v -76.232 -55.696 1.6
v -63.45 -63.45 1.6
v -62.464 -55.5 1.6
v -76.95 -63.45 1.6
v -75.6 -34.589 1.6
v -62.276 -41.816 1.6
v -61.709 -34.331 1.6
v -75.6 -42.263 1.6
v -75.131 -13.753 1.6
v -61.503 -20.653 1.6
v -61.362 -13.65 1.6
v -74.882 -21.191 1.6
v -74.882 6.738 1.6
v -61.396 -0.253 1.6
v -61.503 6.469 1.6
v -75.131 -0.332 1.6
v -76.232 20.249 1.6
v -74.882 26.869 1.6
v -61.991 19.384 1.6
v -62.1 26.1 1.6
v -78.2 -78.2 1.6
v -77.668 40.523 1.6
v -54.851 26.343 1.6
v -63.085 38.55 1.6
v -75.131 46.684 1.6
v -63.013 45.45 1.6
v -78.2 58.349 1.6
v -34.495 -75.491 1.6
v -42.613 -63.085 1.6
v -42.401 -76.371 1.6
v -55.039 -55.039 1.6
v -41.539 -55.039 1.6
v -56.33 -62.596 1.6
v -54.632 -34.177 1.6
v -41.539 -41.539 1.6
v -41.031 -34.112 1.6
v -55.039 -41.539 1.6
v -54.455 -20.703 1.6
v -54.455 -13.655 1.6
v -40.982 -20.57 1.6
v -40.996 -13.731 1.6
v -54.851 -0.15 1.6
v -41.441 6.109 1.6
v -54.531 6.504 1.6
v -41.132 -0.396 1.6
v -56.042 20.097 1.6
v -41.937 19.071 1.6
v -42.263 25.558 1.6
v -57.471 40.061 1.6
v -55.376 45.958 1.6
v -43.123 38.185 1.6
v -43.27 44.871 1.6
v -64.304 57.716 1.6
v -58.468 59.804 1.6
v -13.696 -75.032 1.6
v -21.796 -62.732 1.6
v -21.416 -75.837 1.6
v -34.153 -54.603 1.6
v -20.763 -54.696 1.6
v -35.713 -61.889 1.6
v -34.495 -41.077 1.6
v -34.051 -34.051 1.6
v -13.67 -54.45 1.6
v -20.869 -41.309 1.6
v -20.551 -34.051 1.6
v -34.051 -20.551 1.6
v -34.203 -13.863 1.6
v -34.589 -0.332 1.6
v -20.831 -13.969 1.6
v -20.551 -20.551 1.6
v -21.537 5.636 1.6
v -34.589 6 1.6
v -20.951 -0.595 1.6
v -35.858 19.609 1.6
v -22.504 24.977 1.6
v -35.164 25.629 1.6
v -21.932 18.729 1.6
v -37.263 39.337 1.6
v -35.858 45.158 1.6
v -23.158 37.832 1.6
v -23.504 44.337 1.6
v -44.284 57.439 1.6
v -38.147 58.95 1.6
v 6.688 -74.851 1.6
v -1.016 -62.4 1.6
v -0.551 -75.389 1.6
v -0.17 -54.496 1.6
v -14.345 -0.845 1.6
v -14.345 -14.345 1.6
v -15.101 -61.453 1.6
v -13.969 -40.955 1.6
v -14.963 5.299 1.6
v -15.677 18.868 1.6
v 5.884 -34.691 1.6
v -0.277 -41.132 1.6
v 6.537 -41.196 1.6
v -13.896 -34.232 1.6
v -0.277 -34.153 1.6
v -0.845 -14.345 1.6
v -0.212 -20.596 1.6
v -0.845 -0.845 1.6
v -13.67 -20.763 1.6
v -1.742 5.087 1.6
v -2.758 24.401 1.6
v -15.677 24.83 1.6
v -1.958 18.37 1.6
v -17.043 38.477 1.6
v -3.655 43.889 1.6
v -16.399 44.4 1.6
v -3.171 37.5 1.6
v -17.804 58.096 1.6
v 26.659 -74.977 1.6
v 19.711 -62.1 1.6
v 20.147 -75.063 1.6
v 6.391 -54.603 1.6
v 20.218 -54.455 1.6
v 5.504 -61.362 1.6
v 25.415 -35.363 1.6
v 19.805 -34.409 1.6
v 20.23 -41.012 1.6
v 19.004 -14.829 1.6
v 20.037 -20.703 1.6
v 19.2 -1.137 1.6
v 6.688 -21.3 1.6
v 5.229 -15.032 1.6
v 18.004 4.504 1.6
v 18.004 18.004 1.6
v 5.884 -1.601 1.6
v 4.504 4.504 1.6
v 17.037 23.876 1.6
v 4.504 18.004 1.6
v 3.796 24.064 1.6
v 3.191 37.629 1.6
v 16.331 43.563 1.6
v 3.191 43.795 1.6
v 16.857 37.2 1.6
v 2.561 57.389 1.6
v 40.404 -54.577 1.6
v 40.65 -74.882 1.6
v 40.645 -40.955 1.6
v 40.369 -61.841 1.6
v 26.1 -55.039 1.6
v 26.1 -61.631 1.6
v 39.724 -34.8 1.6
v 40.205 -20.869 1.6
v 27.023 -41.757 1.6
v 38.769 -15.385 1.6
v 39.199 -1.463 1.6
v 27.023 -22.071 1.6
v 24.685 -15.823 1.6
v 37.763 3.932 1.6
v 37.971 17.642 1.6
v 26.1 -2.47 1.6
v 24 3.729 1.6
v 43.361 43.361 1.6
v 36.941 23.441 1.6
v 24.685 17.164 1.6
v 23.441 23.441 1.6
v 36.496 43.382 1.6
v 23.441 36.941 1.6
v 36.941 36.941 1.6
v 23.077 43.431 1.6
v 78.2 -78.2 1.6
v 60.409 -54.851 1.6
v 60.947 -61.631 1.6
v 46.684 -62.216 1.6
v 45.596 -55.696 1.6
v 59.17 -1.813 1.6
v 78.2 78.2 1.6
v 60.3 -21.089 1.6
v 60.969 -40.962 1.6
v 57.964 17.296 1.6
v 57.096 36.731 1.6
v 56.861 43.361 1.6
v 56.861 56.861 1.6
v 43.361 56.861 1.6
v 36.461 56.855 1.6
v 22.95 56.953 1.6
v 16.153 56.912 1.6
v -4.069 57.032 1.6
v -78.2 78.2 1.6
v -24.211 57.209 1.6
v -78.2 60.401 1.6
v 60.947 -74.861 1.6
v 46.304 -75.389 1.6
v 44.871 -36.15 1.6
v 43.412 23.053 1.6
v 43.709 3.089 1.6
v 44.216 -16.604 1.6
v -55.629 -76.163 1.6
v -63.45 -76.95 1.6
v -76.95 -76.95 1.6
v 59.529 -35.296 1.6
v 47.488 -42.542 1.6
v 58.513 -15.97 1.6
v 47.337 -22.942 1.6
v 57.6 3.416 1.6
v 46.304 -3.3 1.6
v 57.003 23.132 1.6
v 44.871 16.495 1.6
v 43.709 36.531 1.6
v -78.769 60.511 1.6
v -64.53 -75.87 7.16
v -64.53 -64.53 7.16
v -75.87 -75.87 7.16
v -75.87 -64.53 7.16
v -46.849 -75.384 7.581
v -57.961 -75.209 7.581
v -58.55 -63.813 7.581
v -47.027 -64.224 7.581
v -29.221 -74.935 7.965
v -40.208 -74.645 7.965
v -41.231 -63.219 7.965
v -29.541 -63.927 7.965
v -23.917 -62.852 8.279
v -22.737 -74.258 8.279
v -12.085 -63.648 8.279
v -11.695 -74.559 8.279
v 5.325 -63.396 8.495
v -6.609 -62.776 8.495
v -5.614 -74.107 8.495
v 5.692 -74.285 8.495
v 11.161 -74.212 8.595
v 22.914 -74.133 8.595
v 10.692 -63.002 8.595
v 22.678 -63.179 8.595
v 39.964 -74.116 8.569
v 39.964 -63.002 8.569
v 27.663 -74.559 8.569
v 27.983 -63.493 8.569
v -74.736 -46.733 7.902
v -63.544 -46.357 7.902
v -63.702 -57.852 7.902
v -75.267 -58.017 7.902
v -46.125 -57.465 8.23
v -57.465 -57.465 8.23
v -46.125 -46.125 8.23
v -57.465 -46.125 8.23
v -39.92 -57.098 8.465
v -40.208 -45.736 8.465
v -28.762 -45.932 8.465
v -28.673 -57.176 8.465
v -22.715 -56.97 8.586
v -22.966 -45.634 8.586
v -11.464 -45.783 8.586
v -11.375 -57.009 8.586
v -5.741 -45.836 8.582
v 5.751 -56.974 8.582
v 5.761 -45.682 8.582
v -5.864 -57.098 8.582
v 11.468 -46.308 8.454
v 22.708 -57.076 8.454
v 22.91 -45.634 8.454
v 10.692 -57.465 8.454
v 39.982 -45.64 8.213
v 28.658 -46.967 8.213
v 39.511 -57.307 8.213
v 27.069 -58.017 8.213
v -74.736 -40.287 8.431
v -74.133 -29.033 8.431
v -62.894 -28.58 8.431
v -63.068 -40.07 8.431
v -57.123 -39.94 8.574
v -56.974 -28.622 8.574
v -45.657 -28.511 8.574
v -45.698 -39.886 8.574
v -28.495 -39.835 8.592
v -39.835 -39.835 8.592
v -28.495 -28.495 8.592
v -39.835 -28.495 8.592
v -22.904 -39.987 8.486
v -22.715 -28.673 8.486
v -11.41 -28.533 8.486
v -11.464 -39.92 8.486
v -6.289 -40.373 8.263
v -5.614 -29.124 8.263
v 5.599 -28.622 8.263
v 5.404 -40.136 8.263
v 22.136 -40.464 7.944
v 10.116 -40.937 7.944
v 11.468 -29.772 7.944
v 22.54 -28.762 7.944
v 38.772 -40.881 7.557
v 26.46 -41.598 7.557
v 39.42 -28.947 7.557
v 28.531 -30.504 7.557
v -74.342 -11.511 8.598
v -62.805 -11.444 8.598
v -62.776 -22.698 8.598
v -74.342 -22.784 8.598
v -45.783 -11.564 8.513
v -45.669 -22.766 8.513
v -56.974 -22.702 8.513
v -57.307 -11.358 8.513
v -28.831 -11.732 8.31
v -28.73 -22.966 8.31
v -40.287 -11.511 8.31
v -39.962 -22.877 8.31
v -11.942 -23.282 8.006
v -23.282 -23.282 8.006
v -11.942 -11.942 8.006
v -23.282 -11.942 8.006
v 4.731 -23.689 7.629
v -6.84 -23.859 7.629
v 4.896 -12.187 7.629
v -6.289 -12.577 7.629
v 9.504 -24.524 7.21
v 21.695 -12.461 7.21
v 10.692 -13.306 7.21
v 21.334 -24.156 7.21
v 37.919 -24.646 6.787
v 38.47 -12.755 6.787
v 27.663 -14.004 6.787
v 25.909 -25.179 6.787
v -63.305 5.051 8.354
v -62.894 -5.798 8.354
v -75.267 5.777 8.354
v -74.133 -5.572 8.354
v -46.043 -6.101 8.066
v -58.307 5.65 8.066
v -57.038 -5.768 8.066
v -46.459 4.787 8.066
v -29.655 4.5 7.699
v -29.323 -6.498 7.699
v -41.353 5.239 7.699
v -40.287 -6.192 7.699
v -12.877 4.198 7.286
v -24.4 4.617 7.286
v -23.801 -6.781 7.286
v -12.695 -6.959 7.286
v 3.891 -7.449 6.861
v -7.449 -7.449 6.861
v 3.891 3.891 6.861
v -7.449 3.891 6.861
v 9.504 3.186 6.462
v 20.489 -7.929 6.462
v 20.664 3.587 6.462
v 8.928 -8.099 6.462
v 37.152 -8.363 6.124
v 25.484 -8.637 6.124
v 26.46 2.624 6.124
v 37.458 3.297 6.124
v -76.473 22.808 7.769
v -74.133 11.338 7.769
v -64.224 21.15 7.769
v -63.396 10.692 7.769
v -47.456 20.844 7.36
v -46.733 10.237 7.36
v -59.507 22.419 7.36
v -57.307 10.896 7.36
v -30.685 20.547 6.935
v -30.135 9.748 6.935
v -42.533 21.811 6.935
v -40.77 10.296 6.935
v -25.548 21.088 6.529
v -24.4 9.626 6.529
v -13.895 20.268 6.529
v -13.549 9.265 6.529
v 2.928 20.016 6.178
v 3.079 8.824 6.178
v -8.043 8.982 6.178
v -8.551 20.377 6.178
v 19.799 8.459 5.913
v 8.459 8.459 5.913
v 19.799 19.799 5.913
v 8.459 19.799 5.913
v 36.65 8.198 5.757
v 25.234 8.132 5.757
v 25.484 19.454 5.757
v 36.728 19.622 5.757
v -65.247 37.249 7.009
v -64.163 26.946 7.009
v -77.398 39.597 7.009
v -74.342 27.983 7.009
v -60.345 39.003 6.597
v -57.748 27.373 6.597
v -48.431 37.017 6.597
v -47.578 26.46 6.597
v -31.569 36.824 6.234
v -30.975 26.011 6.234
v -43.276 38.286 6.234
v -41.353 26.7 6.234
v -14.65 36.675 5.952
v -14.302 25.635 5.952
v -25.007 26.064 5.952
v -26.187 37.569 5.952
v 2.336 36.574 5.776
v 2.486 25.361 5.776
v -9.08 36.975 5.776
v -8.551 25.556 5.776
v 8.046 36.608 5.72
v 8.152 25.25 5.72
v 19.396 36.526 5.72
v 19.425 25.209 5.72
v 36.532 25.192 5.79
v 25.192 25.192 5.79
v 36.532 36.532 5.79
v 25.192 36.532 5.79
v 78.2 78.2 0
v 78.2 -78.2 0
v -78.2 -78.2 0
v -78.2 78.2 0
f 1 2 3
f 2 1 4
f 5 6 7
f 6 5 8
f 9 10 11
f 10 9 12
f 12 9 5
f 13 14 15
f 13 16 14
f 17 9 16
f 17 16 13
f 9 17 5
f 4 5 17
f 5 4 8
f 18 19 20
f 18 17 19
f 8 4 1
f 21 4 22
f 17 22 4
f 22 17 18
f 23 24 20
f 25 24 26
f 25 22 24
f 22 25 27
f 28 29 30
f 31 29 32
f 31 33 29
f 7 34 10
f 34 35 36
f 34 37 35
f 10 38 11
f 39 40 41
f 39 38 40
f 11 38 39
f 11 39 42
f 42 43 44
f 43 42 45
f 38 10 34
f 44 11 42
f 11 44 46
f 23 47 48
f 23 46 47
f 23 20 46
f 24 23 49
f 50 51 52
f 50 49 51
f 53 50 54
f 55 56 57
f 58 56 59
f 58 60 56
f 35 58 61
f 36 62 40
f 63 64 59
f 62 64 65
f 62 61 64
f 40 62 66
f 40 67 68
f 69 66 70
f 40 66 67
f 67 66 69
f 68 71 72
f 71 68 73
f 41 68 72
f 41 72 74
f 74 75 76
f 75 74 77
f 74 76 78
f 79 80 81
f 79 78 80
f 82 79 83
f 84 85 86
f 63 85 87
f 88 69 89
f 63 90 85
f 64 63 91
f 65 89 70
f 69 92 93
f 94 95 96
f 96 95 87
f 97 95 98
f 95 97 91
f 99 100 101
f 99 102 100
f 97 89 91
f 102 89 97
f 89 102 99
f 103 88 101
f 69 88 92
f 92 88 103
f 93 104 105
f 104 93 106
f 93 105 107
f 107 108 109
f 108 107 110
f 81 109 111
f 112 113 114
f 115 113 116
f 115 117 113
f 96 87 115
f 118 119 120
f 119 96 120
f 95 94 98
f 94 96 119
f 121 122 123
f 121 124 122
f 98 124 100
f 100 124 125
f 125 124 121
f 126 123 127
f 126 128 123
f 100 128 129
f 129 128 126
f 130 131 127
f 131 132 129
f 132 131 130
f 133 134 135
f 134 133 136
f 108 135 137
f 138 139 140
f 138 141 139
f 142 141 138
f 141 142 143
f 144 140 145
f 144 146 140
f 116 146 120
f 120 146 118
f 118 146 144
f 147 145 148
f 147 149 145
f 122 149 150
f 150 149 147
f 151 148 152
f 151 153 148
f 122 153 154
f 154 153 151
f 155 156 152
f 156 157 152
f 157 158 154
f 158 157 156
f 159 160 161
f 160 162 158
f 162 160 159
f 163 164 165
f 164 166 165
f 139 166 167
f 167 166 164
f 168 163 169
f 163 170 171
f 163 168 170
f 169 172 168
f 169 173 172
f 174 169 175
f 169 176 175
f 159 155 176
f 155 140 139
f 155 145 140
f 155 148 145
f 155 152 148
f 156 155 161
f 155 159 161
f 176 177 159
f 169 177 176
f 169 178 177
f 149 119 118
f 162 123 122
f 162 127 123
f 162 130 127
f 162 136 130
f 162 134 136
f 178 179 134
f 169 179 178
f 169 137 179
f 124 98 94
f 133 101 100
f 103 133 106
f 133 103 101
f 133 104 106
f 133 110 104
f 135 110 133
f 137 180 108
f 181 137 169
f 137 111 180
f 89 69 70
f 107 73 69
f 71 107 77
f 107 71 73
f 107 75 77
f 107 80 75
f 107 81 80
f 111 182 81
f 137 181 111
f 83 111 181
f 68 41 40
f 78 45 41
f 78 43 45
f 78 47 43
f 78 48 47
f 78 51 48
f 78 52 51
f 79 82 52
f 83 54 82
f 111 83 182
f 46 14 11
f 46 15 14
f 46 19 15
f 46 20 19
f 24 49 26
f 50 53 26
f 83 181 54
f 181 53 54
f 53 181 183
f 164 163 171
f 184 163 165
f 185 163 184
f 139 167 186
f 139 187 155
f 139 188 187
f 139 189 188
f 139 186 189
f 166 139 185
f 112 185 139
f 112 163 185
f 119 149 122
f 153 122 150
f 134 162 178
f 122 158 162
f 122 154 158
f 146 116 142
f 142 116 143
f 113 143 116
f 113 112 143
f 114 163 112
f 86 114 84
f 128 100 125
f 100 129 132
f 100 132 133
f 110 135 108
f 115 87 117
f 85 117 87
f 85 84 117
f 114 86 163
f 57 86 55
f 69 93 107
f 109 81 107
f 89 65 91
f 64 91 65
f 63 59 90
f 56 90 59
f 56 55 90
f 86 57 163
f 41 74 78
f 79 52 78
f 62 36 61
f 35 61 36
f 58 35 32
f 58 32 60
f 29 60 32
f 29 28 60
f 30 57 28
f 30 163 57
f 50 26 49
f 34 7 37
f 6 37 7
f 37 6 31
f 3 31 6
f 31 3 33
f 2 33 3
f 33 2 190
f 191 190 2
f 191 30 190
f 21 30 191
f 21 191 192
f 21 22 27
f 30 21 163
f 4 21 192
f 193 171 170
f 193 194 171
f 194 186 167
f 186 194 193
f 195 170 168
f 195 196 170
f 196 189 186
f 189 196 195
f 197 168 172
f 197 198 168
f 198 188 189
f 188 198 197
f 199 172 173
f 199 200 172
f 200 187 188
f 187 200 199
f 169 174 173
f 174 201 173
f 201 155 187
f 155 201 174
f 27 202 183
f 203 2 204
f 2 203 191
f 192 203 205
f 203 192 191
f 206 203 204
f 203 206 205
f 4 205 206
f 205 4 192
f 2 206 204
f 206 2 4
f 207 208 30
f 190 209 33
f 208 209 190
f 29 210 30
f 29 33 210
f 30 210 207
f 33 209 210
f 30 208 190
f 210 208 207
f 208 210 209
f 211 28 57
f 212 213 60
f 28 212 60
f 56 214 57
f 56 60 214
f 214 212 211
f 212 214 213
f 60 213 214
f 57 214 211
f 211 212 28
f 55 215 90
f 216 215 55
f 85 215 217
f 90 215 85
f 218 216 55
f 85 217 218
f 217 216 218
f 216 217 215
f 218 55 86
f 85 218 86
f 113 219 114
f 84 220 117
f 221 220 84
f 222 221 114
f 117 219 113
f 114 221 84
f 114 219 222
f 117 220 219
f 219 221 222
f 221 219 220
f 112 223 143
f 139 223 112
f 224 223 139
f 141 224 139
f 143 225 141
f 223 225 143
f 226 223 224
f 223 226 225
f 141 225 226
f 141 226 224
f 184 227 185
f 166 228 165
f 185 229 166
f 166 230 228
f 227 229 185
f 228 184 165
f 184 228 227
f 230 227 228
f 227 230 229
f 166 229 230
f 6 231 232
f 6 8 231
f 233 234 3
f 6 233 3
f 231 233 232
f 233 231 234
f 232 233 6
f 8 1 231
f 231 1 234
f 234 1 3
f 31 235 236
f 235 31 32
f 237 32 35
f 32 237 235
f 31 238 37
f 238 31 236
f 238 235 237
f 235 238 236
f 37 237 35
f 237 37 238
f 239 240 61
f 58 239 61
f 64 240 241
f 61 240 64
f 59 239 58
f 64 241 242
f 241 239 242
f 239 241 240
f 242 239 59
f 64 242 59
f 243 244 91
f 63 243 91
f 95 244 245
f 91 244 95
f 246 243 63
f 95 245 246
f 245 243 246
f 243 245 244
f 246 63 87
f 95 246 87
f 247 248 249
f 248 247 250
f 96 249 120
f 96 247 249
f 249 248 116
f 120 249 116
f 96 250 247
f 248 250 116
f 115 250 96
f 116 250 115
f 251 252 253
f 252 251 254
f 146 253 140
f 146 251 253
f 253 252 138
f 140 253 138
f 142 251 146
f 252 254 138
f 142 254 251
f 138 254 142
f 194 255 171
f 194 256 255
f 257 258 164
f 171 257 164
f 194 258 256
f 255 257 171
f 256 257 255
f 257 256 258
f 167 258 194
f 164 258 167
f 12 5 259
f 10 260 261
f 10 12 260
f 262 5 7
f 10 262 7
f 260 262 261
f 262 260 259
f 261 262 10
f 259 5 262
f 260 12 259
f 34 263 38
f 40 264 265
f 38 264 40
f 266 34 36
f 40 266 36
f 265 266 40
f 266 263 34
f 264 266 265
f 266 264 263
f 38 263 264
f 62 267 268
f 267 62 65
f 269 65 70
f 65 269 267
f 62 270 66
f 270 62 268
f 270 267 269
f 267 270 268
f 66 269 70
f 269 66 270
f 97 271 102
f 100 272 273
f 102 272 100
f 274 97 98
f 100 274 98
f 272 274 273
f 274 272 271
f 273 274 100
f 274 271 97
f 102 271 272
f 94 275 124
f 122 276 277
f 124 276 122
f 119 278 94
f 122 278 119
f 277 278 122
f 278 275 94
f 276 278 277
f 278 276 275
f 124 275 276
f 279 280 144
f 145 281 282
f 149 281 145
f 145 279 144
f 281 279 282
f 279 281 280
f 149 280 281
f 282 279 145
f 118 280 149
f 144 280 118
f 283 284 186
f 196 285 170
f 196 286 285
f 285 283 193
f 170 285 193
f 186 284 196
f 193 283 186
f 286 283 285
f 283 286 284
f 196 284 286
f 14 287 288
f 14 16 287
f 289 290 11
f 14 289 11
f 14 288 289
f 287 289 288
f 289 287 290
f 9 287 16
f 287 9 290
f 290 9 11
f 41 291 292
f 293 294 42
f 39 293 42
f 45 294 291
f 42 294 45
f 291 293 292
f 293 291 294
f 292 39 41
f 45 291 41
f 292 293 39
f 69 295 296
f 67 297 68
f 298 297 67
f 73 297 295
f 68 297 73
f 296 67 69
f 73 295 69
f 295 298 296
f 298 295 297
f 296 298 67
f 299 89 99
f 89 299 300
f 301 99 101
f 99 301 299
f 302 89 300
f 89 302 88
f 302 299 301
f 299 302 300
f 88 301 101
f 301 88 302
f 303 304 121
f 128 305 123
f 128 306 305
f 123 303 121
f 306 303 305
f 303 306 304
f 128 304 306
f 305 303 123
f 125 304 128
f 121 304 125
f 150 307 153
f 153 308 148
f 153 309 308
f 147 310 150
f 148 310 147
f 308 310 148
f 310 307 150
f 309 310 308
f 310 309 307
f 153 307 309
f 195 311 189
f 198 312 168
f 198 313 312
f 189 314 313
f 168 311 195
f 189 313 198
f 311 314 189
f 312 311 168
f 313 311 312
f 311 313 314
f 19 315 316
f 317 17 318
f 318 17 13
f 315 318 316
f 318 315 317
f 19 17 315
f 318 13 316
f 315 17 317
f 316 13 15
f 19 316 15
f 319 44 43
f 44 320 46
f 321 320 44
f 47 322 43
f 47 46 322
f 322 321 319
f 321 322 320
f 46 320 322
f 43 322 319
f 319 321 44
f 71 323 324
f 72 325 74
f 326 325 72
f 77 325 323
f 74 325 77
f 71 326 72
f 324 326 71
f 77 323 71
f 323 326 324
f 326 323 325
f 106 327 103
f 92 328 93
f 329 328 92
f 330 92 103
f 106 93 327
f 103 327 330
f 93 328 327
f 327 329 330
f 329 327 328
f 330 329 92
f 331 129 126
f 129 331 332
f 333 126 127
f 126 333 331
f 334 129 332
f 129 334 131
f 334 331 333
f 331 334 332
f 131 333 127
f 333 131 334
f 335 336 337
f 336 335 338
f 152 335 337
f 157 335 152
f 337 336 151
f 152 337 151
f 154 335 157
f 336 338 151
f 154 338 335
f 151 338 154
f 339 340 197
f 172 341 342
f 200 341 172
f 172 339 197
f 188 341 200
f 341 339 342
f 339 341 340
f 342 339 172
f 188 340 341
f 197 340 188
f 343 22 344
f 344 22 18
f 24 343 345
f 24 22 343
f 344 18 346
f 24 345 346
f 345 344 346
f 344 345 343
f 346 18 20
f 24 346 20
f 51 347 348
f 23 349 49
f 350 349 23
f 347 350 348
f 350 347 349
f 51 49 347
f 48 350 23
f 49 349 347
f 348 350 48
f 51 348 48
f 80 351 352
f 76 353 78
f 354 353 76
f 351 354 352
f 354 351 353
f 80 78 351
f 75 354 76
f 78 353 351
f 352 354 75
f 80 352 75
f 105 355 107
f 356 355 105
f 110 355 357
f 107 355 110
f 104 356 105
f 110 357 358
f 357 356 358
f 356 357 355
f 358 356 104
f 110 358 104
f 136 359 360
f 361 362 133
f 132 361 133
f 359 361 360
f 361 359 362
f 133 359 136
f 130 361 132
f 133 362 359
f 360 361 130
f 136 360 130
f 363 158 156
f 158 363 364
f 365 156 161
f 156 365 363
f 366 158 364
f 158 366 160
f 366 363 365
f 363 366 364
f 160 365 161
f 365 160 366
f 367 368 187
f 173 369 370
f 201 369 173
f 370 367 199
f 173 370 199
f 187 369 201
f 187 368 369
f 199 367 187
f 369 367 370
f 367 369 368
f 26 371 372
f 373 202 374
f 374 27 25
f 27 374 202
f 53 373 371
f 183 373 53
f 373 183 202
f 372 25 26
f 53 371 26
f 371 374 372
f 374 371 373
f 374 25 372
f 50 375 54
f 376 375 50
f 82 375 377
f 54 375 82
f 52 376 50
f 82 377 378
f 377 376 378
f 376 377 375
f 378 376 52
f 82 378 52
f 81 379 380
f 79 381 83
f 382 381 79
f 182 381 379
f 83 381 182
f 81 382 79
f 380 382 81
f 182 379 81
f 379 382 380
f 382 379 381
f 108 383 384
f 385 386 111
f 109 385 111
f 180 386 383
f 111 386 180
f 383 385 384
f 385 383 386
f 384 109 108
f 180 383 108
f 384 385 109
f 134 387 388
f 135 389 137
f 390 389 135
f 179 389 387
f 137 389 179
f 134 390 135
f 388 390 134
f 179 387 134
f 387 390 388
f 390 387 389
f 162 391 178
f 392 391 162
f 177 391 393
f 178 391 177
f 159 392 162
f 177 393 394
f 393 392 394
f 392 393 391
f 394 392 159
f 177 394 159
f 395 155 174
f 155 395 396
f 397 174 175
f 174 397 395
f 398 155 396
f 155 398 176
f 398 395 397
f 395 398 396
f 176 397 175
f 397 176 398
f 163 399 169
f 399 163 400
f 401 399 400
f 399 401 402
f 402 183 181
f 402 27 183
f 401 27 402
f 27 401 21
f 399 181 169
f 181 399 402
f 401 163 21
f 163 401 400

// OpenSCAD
// Quads Relief
// Forge3D curated example inspired by Jeff Barr's MIT collection.

$fn = $preview ? 24 : 48;

rows = 7;
cols = 7;
cell_size = 18;
cell_gap = 2.4;
quad_size = 13.5;
base_thickness = 1.6;
height_base = 3.8;
height_variation = 3.2;
perturb = 2.1;

function grid_width() = cols * cell_size + (cols - 1) * cell_gap;
function grid_depth() = rows * cell_size + (rows - 1) * cell_gap;

function cell_center(row, col) = [
  col * (cell_size + cell_gap),
  row * (cell_size + cell_gap)
];

function quad_height(row, col) =
  height_base + height_variation * (0.55 + 0.45 * sin(row * 31 + col * 17));

function skew(row, col, seed) =
  sin(row * (17 + seed) + col * (29 - seed)) * perturb;

module quad_tile(row, col) {
  center_point = cell_center(row, col);
  half_size = quad_size / 2;
  points = [
    [center_point[0] - half_size + skew(row, col, 3), center_point[1] - half_size + skew(row, col, 7)],
    [center_point[0] + half_size + skew(row, col, 11), center_point[1] - half_size + skew(row, col, 13)],
    [center_point[0] + half_size + skew(row, col, 17), center_point[1] + half_size + skew(row, col, 19)],
    [center_point[0] - half_size + skew(row, col, 23), center_point[1] + half_size + skew(row, col, 5)]
  ];

  translate([0, 0, base_thickness]) {
    linear_extrude(height = quad_height(row, col), scale = 0.84, convexity = 6) {
      polygon(points = points);
    }
  }
}

color("Gainsboro") {
  union() {
    translate([-grid_width() / 2 - 8, -grid_depth() / 2 - 8, 0]) {
      cube([grid_width() + 16, grid_depth() + 16, base_thickness], center = false);
    }

    translate([-grid_width() / 2, -grid_depth() / 2, 0]) {
      for (row = [0 : rows - 1]) {
        for (col = [0 : cols - 1]) {
          quad_tile(row, col);
        }
      }
    }
  }
}
